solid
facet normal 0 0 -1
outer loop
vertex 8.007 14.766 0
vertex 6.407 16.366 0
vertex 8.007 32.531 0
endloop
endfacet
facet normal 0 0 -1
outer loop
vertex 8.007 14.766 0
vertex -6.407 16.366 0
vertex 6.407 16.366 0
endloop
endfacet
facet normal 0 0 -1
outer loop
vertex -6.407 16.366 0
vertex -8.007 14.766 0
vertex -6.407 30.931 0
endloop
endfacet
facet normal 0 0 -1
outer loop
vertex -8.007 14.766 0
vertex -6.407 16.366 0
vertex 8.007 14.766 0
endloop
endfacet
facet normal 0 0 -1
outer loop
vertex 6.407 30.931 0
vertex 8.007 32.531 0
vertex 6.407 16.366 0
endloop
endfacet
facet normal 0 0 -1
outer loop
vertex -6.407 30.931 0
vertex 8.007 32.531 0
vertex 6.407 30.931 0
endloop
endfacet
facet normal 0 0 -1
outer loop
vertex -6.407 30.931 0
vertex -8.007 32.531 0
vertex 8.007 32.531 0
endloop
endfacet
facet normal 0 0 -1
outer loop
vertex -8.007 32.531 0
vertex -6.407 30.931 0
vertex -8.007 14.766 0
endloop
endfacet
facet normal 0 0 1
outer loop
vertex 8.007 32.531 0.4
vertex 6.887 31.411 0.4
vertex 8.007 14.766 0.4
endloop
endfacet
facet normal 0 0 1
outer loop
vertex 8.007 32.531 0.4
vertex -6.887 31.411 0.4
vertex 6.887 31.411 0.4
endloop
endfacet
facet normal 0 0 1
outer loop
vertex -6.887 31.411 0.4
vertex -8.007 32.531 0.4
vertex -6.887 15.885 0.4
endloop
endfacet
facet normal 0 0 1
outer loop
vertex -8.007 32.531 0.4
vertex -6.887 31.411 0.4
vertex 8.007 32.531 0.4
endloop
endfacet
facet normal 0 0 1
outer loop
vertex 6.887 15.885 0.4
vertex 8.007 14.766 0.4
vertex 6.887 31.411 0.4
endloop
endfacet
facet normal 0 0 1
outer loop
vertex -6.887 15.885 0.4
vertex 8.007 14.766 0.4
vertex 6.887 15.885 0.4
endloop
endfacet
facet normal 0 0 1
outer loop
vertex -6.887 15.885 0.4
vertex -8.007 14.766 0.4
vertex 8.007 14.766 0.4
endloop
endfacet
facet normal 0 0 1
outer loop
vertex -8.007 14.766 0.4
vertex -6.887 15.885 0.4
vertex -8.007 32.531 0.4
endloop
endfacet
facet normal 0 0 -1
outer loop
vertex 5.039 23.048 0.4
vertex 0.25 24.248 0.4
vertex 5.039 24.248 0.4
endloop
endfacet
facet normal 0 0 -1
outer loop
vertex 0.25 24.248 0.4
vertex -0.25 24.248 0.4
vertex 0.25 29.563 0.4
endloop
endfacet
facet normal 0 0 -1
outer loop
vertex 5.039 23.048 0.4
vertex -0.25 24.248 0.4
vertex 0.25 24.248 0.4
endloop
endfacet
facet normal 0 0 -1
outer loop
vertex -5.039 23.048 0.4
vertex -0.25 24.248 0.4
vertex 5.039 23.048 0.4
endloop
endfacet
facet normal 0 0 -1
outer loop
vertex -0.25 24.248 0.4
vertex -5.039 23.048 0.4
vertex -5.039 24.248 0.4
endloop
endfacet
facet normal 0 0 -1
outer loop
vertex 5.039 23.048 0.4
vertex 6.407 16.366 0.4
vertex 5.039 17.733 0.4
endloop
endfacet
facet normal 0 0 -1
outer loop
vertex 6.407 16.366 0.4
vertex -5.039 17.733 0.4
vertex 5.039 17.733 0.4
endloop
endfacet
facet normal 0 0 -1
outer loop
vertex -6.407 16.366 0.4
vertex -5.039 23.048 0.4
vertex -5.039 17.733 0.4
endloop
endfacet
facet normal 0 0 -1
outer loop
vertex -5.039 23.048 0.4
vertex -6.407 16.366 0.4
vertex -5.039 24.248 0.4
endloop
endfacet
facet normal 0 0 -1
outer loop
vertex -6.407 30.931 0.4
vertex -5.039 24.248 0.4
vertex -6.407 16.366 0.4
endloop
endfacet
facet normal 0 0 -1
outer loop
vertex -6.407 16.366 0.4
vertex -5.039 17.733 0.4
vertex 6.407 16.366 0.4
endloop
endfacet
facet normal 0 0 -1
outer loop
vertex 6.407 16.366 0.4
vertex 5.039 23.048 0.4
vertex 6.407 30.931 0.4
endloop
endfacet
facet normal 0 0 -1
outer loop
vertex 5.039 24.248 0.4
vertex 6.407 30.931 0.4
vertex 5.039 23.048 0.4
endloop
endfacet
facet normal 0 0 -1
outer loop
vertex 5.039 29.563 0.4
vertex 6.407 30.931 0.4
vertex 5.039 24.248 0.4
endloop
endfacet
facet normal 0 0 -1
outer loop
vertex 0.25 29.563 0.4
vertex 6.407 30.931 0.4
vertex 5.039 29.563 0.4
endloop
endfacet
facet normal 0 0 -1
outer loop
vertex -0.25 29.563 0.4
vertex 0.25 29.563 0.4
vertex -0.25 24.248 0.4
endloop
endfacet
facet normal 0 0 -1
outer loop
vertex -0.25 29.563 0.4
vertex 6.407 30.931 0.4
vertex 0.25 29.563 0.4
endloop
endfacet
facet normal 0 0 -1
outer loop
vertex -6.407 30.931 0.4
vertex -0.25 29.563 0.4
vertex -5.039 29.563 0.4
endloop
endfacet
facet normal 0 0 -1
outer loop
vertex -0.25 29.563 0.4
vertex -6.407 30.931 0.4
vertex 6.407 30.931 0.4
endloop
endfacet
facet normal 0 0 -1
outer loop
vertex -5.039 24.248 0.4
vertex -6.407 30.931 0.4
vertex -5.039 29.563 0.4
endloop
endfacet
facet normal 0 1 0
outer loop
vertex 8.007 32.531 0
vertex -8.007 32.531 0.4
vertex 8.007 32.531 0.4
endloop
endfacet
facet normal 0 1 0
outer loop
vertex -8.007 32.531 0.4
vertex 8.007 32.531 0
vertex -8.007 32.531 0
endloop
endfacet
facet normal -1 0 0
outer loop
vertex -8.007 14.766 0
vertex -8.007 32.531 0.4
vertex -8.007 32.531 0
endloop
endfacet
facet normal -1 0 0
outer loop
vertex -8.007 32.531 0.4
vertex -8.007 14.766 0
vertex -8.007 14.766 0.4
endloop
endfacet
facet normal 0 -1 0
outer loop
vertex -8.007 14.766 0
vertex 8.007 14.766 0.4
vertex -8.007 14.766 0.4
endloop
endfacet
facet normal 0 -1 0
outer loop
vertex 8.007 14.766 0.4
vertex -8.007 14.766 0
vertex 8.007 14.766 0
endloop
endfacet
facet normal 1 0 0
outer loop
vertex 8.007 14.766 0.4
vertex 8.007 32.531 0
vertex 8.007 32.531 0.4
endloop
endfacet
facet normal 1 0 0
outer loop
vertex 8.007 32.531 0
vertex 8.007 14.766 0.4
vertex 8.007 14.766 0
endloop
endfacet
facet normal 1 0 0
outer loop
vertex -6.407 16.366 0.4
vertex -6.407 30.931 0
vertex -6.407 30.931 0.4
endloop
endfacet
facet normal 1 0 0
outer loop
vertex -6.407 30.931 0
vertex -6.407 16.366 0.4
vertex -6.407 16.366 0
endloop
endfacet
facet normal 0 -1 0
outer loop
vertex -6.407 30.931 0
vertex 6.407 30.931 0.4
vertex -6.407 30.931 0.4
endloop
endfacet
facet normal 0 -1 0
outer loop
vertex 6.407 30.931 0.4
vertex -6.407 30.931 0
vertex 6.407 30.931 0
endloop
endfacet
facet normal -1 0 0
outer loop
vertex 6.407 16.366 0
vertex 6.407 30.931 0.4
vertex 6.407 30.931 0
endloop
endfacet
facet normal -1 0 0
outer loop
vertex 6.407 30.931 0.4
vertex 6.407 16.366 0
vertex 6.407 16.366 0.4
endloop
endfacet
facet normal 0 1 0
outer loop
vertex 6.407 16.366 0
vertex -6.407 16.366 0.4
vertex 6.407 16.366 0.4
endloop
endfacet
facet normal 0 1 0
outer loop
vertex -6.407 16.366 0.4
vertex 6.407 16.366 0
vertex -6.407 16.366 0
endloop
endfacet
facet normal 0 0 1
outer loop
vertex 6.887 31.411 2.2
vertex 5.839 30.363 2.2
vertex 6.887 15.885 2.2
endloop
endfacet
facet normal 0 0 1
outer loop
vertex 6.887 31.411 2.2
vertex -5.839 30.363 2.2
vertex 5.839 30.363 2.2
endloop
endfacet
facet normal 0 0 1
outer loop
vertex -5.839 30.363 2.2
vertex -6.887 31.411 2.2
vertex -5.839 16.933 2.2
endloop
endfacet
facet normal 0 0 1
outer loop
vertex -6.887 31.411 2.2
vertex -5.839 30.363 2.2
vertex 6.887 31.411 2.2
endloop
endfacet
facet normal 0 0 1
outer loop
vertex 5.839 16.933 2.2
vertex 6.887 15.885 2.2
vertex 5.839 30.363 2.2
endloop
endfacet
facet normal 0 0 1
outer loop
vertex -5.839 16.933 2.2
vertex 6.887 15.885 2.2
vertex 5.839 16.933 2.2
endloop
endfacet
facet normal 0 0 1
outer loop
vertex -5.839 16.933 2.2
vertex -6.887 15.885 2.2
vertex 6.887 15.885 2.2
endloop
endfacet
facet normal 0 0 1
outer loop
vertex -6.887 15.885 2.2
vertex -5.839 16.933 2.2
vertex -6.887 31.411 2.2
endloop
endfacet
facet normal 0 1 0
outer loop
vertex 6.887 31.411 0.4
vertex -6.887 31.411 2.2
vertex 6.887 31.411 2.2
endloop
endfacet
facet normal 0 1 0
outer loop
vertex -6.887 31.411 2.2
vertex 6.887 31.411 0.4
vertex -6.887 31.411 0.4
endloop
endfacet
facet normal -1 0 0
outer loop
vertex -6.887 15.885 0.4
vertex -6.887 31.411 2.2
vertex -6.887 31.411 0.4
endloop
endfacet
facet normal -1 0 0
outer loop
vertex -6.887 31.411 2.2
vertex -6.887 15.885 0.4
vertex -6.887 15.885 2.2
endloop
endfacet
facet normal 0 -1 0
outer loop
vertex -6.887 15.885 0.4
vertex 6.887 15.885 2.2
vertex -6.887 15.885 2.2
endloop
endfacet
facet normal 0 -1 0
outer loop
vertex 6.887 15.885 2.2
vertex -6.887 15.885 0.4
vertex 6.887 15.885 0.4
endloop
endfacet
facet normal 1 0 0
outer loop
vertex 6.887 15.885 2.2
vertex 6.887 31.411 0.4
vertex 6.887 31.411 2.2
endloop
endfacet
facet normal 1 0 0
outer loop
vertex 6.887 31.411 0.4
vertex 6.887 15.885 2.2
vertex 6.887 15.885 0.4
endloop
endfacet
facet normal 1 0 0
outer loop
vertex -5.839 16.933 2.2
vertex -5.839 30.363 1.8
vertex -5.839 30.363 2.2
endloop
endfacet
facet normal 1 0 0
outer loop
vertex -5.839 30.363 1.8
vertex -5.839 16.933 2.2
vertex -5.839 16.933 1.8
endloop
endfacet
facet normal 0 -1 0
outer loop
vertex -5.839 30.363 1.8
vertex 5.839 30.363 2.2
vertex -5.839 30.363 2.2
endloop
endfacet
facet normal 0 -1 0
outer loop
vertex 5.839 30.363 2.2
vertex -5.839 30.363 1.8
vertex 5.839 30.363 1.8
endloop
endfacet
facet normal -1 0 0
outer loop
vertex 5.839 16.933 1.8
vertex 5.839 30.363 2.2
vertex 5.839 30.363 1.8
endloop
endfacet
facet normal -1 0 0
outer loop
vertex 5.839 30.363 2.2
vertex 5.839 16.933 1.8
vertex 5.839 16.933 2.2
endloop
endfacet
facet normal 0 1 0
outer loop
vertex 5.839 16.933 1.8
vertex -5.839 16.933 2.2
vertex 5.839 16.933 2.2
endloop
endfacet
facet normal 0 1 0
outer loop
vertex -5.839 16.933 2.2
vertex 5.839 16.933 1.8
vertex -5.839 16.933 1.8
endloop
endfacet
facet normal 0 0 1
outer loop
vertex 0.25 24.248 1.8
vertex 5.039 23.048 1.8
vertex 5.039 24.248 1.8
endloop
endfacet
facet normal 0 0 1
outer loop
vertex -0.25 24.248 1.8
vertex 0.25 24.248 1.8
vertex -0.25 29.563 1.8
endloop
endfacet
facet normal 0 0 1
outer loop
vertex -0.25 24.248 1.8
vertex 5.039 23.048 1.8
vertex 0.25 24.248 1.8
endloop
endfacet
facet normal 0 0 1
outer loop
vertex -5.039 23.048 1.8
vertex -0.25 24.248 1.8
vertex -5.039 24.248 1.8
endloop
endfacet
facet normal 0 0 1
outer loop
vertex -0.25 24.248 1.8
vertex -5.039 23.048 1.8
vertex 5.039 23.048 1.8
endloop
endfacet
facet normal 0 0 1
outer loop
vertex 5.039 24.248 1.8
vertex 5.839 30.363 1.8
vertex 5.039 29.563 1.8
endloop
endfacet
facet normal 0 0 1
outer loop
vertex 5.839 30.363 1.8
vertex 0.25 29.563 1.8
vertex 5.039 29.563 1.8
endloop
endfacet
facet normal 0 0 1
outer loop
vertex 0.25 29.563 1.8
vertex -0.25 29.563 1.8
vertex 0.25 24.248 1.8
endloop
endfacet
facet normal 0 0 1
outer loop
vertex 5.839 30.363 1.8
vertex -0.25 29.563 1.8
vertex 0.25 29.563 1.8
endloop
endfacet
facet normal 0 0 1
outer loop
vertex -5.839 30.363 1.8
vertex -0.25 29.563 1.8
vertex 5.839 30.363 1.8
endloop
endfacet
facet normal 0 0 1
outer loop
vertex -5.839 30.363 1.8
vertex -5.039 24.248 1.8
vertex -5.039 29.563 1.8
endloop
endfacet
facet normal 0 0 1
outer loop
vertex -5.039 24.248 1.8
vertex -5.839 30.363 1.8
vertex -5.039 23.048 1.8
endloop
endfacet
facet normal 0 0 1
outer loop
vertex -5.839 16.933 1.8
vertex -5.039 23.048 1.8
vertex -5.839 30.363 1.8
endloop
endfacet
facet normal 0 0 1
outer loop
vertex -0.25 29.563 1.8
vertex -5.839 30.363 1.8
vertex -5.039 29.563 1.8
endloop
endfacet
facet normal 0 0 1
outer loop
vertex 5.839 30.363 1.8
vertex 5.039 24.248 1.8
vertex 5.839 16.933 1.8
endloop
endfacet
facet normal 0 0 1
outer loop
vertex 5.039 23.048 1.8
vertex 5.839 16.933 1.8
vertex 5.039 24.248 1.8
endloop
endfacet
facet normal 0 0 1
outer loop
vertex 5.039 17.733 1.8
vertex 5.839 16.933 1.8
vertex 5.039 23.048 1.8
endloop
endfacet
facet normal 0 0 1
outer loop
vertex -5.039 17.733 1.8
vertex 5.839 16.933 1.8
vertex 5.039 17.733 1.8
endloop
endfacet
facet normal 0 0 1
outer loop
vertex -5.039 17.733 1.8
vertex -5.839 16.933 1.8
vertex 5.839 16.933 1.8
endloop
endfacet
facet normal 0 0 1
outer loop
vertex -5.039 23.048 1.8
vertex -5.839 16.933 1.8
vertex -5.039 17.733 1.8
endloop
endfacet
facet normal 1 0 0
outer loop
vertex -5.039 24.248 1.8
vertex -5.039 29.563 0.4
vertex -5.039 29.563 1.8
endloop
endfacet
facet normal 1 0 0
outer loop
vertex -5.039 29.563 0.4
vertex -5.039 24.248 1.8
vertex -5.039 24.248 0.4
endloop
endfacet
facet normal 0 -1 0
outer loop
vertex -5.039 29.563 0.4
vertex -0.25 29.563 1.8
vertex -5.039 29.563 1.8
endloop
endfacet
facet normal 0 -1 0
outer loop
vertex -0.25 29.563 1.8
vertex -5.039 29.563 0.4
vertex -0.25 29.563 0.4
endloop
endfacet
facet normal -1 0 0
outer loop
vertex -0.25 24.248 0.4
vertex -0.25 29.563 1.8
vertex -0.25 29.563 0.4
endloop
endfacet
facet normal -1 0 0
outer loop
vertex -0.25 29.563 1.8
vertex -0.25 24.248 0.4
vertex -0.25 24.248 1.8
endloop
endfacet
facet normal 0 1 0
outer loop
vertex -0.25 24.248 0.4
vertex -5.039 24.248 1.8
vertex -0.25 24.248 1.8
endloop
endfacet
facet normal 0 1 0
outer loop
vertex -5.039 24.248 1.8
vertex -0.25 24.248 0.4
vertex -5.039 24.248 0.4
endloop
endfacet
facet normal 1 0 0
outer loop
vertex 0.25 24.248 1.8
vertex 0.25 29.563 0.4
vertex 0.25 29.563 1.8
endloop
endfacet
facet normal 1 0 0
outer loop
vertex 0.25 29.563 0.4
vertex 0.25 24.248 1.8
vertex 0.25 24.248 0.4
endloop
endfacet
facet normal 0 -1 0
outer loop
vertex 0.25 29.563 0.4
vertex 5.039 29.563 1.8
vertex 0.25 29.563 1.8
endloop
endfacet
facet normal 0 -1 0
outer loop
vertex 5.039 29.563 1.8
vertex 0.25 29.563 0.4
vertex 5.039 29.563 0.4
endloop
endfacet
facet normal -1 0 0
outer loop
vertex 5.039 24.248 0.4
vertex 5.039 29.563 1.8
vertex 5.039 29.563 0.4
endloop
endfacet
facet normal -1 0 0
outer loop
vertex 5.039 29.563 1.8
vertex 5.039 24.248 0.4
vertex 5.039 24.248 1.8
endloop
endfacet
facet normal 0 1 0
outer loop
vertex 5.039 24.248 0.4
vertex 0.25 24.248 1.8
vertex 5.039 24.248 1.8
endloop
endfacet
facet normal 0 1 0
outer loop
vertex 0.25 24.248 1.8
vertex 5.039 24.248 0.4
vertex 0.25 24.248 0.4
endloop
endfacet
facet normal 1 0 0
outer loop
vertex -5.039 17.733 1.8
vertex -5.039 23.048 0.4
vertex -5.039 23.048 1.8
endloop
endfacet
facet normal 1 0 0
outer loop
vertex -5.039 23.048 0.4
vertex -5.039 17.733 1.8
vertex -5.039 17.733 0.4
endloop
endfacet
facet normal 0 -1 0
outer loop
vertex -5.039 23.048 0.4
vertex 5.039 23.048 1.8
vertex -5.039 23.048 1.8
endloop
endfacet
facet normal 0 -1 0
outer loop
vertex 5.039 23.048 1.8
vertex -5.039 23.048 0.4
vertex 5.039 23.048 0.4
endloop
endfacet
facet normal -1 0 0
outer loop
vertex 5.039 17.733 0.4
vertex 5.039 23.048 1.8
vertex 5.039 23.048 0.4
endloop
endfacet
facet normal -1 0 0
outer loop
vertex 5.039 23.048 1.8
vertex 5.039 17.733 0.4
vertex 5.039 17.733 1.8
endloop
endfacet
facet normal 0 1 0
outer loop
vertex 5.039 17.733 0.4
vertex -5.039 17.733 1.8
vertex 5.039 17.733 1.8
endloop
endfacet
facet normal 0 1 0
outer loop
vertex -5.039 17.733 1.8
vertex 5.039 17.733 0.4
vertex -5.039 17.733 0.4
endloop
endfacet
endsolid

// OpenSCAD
// file: ../janesville_common.scad
// =====================================================================
//  CMSP Janesville WI Station - shared settings and footprint
//  Frost & Granger, 1902 as-built prints.  HO scale 1:87 (adapted from the G scale 1:29 model).  Units: model mm.
//  Every other .scad file in this project does:  include <../janesville_common.scad>
// =====================================================================

// ---------- scale ----------
SCALE = 87;
BX = 2;        // brick, slate and tile texture is drawn this many times oversize so a 0.4 mm nozzle can print it
$sc = 0;      // furniture is drawn at the G-scale size and reduced: see g() in Furniture/interior.scad
function ft(f, i = 0) = (f * 12 + i) * 25.4 / ($sc == 0 ? SCALE : $sc);   // real feet + inches -> model mm

// ---------- printer ----------
// "P1S"  = Bambu Lab P1S, 256 x 256 x 256 bed  (use 252 usable)
// "GIGA" = Tom's large-format printer, 800 x 800 x 1000 (use 780 usable)
PRINTER = "P1S";
function bed_for(p) = p == "GIGA" ? [780, 780, 980] : [252, 252, 250];
BED = bed_for(PRINTER);

// ---------- colors (preview only; print color = filament) ----------
PULLMAN_GREEN = "#3B4A2C";   // windows, doors, trim
BRICK_RED     = "#8E3B2C";
MORTAR_WHITE  = "#F2EFE6";
STONE_BUFF    = "#C9B79C";

// ---------- joints between printed sections ----------
PIN_D      = 1.75;   // alignment pin (a stub of 1.75 mm filament)
PIN_CLEAR  = 0.2;   // hole oversize
PIN_DEPTH  = 4;      // hole depth each side of a cut
CUT_BAND   = 3;      // solid band each side of a cut so pins land in plastic

// ---------- NeoPixel wiring ----------
WIRE_CHANNEL = [6, 3.5];   // width x height of notches in under-floor ribs (3-wire bus)
FEED_HOLE_D  = 5;         // hole up through the floor into each room

// ---------- coordinates ----------
// x runs west -> east along the track.  x = 0 at the west end wall line.
// y = 0 at the main track-side wall line, +y toward town.
// Dimensions are to the MAIN WALL LINE (as the drawings are figured).

// Main building, B2077 / B2076.  Overall 128'-5".
X_WEST_END   = 0;
X_PAV_W      = ft(38, 9);                 // general waiting room wing  38'-9"
X_PAV_E      = X_PAV_W + ft(22, 6);       // center pavilion            22'-6"
X_SMOKE_E    = X_PAV_E + ft(36, 10);      // smoking room wing          36'-10"
X_MAIN_E     = X_SMOKE_E + ft(30, 4);     // lunch room wing            30'-4"  -> 128'-5"
MAIN_DEPTH   = ft(32, 0);                 // west wing, pavilion, smoking wing

// Lunch-room wing is narrower: 25'-4" deep (7'-2" + 11'-0" + 7'-2"),
// set back 1'-5" on the track side and 5'-3" on the town side.  VERIFY vs B2078/B2079.
LUNCH_Y0     = ft(1, 5);
LUNCH_Y1     = LUNCH_Y0 + ft(25, 4);

// Pavilion projections.  APPROXIMATE - verify against elevations.
PORCH_PROJ   = ft(3, 6);    // town side: two 6'-9" blocks project 3'-6"
PORCH_W      = ft(9, 0);    // recessed porch between them (open to y = MAIN_DEPTH)
BAY_PROJ     = ft(3, 0);    // track side: canted ticket-office bay
BAY_W_WALL   = ft(15, 6);   // bay width at the wall
BAY_W_FRONT  = ft(9, 6);    // bay width at its face
BAY_CX       = ft(46, 11);  // bay center from west end (B2077 track-side chain), not centered on the pavilion

// Baggage & express building, B2077: 47'-2" x 25'-4", 42'-0" east of the main building.
// Track wall assumed in line with the lunch wing.  VERIFY.
X_BAG_W      = X_MAIN_E + ft(42, 0);
X_BAG_E      = X_BAG_W + ft(47, 2);
BAG_Y0       = LUNCH_Y0;
BAG_Y1       = BAG_Y0 + ft(25, 4);

// Wall thicknesses (model mm)
T_MAIN  = 3.0;     // main block exterior walls (real 1'-5" = 5.0 mm, thinned)
T_LIGHT = 2.6;     // lunch wing, porch, bay, baggage building

// Heights (B2082 / B2078)
FLOOR_Z      = ft(1, 9);    // finished floor above finished grade
WALL_H       = ft(19, 0);   // floor to cornice, town side
SILL_H       = ft(2, 9);    // floor to top of window sill
BASE_PROJ    = ft(0, 4);    // stone base / water table projects past the wall line

// ---------- footprints (2D) ----------
module footprint_main() {
    union() {
        translate([X_WEST_END, 0]) square([X_SMOKE_E - X_WEST_END, MAIN_DEPTH]);
        translate([X_SMOKE_E, LUNCH_Y0]) square([X_MAIN_E - X_SMOKE_E, LUNCH_Y1 - LUNCH_Y0]);
        // town-side pavilion blocks with the recessed porch between them
        difference() {
            translate([X_PAV_W, MAIN_DEPTH - 0.01]) square([X_PAV_E - X_PAV_W, PORCH_PROJ]);
            translate([(X_PAV_W + X_PAV_E - PORCH_W) / 2, MAIN_DEPTH - 1]) square([PORCH_W, PORCH_PROJ + 2]);
        }
        // track-side canted bay
        let(cx = BAY_CX)
        polygon([[cx - BAY_W_WALL / 2, 0.01], [cx + BAY_W_WALL / 2, 0.01],
                 [cx + BAY_W_FRONT / 2, -BAY_PROJ], [cx - BAY_W_FRONT / 2, -BAY_PROJ]]);
    }
}

module footprint_baggage() {
    translate([X_BAG_W, BAG_Y0]) square([X_BAG_E - X_BAG_W, BAG_Y1 - BAG_Y0]);
}
// main file
// =====================================================================
//  Windows and doors  -  one Pullman-green insert per opening in walls.scad
//  Each insert: a plug that fits the opening (set back 1.5 mm from the brick face),
//  a frame, sash or door leaves with muntins, and a thin flange on the inside face.
//  Glazing: cut clear acetate / PETG sheet to the recess on the inside and glue it in.
//  Printed flat, outside face up.  Openings marked "void" in walls.scad get no insert.
//
//  window_list()  -> ["<wall>|<index>", ...]      window_part(id)   window_place(id)
// =====================================================================
include <../janesville_common.scad>
use <walls.scad>

WIN  = "Main_town|0";   // when opened directly
VIEW = "flat";          // "flat" or "placed"

CLEAR   = 0.12;          // fit clearance per side
REVEAL  = 0.8;           // insert sits this far back from the brick face
FLANGE  = 1.0;           // inside flange, beyond the opening
FLANGE_T = 0.4;          // flange / glazing recess depth
FRAME   = ft(0, 4);      // window/door frame
SASH    = 0.8;            // sash stiles and rails
MUNTIN  = 0.5;           // glazing bars (printable minimum)
SASH_SET = 0.4;          // sash face sits back from the frame face
LEAF_SET = 0.5;          // door leaf face sits back from the frame face
GROOVE  = 0.4;          // panel / board grooves
$fn = 64;

// ---------- which openings get inserts ----------
function w_open(name) = wrow(name)[6];
function window_part_name(id) = str("Window_", wid_wall(id), "_", wid_index(id));
function window_list() = [for (n = walls_list()) let(o = w_open(n))
    for (i = [0 : len(o) - 1]) if (len(o) > 0 && o[i][0] != "void") str(n, "|", i)];
function wid_wall(id) = let(p = search("|", id)[0]) substr(id, 0, p);
function wid_index(id) = let(p = search("|", id)[0]) parse_int(substr(id, p + 1));
function substr(s, a, n = -1) = let(e = n < 0 ? len(s) : a + n) str_join([for (i = [a : e - 1]) s[i]]);
function str_join(v, i = 0) = i >= len(v) ? "" : str(v[i], str_join(v, i + 1));
function parse_int(s, i = 0, acc = 0) = i >= len(s) ? acc : parse_int(s, i + 1, acc * 10 + (ord(s[i]) - 48));
function w_style(name) = substr(name, 0, 7) == "Baggage" ? "board" : "panel";

// ---------- 2D shapes, local coords: u = 0 at opening center, v = height above floor (mm) ----------
module open2d(o, d = 0) {       // the opening, grown (+) or shrunk (-) by d
    w = ft(o[2]); b = ft(o[3]); t = ft(o[4]);
    offset(delta = d) {
        translate([-w / 2, b - (b == 0 ? 2 : 0)]) square([w, t - b + (b == 0 ? 2 : 0)]);
        if (o[0] == "arch") translate([0, t]) circle(d = w);
    }
}
module frame2d(o) difference() { open2d(o, -CLEAR); open2d(o, -FRAME); }
module glass2d(o) open2d(o, -FRAME);

// window sash lattice (double-hung; paired with a mullion when wide; arched fanlight)
module sash2d(o) intersection() {
    glass2d(o);
    w = ft(o[2]); b = ft(o[3]); t = ft(o[4]);
    gb = b + FRAME; gt = t - (o[0] == "arch" ? 0 : FRAME);
    pair = o[2] >= 5;
    mid = (gb + gt) / 2;
    union() {
        difference() { glass2d(o); offset(delta = -SASH) glass2d(o); }      // sash perimeter
        translate([-w, mid - SASH * 0.75]) square([2 * w, SASH * 1.5]);       // meeting rail
        if (pair) translate([-FRAME / 2, 0]) square([FRAME, t + w]);          // center mullion
        // upper-sash muntins: two lights per sash
        for (s = pair ? [-1, 1] : [0]) let(cx = s * w / 4)
            translate([cx - MUNTIN / 2, mid]) square([MUNTIN, gt - mid]);
        if (o[0] == "arch") {
            translate([-w, t - FRAME / 2]) square([2 * w, FRAME]);           // transom bar at springing
            translate([0, t]) intersection() {
                translate([-w, 0]) square([2 * w, w]);                               // fanlight only above springing
                union() {
                    for (a = [30 : 30 : 150]) rotate(a) translate([0, -MUNTIN / 2]) square([w, MUNTIN]);
                    difference() { circle(r = w * 0.16 + MUNTIN); circle(r = w * 0.16); }   // fan hub
                }
            }
        }
    }
}

// door leaves: glazed upper panel, two raised lower panels (or vertical boards for baggage doors)
LEAF_TOP = 8;      // ft, top of door leaves; anything above is transom / fanlight
module leaves2d(o) intersection() {
    glass2d(o);
    w = ft(o[2]); lt = min(ft(o[4]) - FRAME, ft(LEAF_TOP));
    translate([-w, -5]) square([2 * w, lt + 5]);
}
module leaf_glass2d(o, style) if (style == "panel") {
    w = ft(o[2]); n = o[2] >= 4.5 ? 2 : 1; lw = (w - 2 * FRAME) / n; lt = min(ft(o[4]) - FRAME, ft(LEAF_TOP));
    for (i = [0 : n - 1]) translate([-w / 2 + FRAME + i * lw + SASH, ft(4)]) square([lw - 2 * SASH, lt - ft(4) - SASH]);
}
module leaf_detail2d(o, style) {           // grooves on the leaf face
    w = ft(o[2]); n = o[2] >= 4.5 ? 2 : 1; lw = (w - 2 * FRAME) / n; lt = min(ft(o[4]) - FRAME, ft(LEAF_TOP));
    if (style == "panel") for (i = [0 : n - 1]) {
        x0 = -w / 2 + FRAME + i * lw;
        translate([x0 - GROOVE / 2 + (i > 0 ? 0 : lw), 0]) square([GROOVE, lt]);               // meeting stile
        for (p = [[ft(0.75), ft(1.75)], [ft(2.1), ft(3.6)]])                                    // two raised panels
            translate([x0 + SASH, p[0]]) difference() {
                square([lw - 2 * SASH, p[1] - p[0]]);
                translate([GROOVE, GROOVE]) square([lw - 2 * SASH - 2 * GROOVE, p[1] - p[0] - 2 * GROOVE]);
            }
    } else {
        for (u = [-w / 2 + ft(1) : ft(1) : w / 2 - 0.5]) translate([u - GROOVE / 2, 0]) square([GROOVE, lt]);   // boards
        translate([-w, ft(2) - GROOVE / 2]) square([2 * w, GROOVE]);                                       // ledgers
        translate([-w, lt - ft(2) - GROOVE / 2]) square([2 * w, GROOVE]);
    }
}
// transom / fanlight above a door
module transom2d(o) {
    w = ft(o[2]); t = ft(o[4]); lt = min(t - FRAME, ft(LEAF_TOP));
    if (t - lt > ft(1)) intersection() {
        glass2d(o);
        difference() {
            translate([-w, lt]) square([2 * w, t + w]);
            translate([0, 0]) offset(delta = -SASH) intersection() { glass2d(o); translate([-w, lt + SASH]) square([2 * w, t + w]); }
        }
    }
    if (o[0] == "arch") translate([0, t]) intersection() {
        circle(d = w - 2 * FRAME);
        union() { for (a = [30 : 30 : 150]) rotate(a) translate([0, -MUNTIN / 2]) square([w, MUNTIN]);
                  translate([-w, -FRAME / 2]) square([2 * w, FRAME]); }
    }
}

// ---------- the insert, flat: inside face at z = 0, outside face up ----------
module window_flat(id, only = -1) {
    n = wid_wall(id); o = w_open(n)[wid_index(id)]; T = wrow(n)[3]; D = T - REVEAL;
    door = o[3] == 0; style = w_style(n);
    module L(k, z0, z1) if (only < 0 || only == k) translate([0, 0, z0]) linear_extrude(z1 - z0) children();
    // flange + glazing recess
    L(0, 0, FLANGE_T) difference() { open2d(o, FLANGE); if (door) leaves2d(o); open2d(o, -0.6);
                                     if (door) translate([-ft(o[2]), -10]) square([2 * ft(o[2]), 10 + 0.01]); }
    // frame, full depth
    L(1, FLANGE_T, D) difference() { frame2d(o); if (door) translate([-ft(o[2]), -10]) square([2 * ft(o[2]), 10]); }
    if (!door) L(2, FLANGE_T, D - SASH_SET) sash2d(o);
    if (door) {
        L(3, 0, D - LEAF_SET - 0.3) difference() { leaves2d(o); leaf_glass2d(o, style); }
        L(4, D - LEAF_SET - 0.3, D - LEAF_SET) difference() { leaves2d(o); leaf_glass2d(o, style); leaf_detail2d(o, style); }
        L(5, FLANGE_T, D - SASH_SET) transom2d(o);
    }
}

module window_part(id) color(PULLMAN_GREEN) window_flat(id);

// standing in its opening on the building (same transform as wall_place)
module window_place(id) {
    n = wid_wall(id); r = wrow(n); o = w_open(n)[wid_index(id)]; T = r[3]; org = r[7]; a = r[8];
    off = r[4] ? T : 0;
    translate([org[0], org[1], FLOOR_Z]) rotate([0, 0, a]) translate([off, 0, 0])
        rotate([90, 0, 0]) translate([0, 0, -T]) translate([ft(o[1]) - off, 0, 0]) color(PULLMAN_GREEN) window_flat(id);
}

LAYER = -1;   // cloud export helper
if (VIEW == "placed") for (id = window_list()) window_place(id);
else if (LAYER >= 0) window_flat(WIN, LAYER);
else window_part(WIN);
